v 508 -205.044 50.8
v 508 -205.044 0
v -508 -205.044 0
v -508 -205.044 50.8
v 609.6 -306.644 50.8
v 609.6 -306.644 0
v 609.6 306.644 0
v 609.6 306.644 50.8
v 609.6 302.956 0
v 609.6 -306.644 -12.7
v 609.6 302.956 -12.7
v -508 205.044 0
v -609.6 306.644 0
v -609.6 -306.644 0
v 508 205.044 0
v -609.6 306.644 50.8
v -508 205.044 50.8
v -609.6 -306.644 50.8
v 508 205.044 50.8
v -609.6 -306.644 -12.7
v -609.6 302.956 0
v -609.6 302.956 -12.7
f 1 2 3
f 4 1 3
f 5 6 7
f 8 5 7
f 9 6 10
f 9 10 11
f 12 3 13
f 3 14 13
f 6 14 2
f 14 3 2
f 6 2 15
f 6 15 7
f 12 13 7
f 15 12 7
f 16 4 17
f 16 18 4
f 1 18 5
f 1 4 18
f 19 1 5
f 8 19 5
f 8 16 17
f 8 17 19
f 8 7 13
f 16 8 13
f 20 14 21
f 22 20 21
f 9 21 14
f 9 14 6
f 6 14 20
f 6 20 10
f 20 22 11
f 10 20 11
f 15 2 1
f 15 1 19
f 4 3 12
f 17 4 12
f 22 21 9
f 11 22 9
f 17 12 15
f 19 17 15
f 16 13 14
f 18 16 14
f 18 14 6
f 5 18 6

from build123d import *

# Parameters (mm, degrees)
F0_W     = 1219.2
F0_H     = 609.6
F1_DEPTH = 12.7
F2_W     = 101.6
F2_H     = 410.08788
F3_DEPTH = 50.8


with BuildPart() as f1:
    # F0 (on Top) → F1 (new body)
    with BuildSketch(Plane.XY):
        with Locations((0, -1.84394)):
            Rectangle(F0_W, F0_H)
    extrude(amount=-F1_DEPTH)


with BuildPart() as f3:
    # F2 (on face) → F3 (new body)
    with BuildSketch(Plane.XY):
        Polygon((-609.6, -205.04394), (-609.6, -306.64394), (609.6, -306.64394), (609.6, -205.04394), (508, -205.04394), (-508, -205.04394), align=None)
        with Locations((-558.8, 0)):
            Rectangle(F2_W, F2_H)
        with Locations((558.8, 0)):
            Rectangle(F2_W, F2_H)
        Polygon((-609.6, 306.64394), (-609.6, 205.04394), (-508, 205.04394), (508, 205.04394), (609.6, 205.04394), (609.6, 306.64394), align=None)
    extrude(amount=F3_DEPTH)


solid = Compound([f1.part, f3.part])
